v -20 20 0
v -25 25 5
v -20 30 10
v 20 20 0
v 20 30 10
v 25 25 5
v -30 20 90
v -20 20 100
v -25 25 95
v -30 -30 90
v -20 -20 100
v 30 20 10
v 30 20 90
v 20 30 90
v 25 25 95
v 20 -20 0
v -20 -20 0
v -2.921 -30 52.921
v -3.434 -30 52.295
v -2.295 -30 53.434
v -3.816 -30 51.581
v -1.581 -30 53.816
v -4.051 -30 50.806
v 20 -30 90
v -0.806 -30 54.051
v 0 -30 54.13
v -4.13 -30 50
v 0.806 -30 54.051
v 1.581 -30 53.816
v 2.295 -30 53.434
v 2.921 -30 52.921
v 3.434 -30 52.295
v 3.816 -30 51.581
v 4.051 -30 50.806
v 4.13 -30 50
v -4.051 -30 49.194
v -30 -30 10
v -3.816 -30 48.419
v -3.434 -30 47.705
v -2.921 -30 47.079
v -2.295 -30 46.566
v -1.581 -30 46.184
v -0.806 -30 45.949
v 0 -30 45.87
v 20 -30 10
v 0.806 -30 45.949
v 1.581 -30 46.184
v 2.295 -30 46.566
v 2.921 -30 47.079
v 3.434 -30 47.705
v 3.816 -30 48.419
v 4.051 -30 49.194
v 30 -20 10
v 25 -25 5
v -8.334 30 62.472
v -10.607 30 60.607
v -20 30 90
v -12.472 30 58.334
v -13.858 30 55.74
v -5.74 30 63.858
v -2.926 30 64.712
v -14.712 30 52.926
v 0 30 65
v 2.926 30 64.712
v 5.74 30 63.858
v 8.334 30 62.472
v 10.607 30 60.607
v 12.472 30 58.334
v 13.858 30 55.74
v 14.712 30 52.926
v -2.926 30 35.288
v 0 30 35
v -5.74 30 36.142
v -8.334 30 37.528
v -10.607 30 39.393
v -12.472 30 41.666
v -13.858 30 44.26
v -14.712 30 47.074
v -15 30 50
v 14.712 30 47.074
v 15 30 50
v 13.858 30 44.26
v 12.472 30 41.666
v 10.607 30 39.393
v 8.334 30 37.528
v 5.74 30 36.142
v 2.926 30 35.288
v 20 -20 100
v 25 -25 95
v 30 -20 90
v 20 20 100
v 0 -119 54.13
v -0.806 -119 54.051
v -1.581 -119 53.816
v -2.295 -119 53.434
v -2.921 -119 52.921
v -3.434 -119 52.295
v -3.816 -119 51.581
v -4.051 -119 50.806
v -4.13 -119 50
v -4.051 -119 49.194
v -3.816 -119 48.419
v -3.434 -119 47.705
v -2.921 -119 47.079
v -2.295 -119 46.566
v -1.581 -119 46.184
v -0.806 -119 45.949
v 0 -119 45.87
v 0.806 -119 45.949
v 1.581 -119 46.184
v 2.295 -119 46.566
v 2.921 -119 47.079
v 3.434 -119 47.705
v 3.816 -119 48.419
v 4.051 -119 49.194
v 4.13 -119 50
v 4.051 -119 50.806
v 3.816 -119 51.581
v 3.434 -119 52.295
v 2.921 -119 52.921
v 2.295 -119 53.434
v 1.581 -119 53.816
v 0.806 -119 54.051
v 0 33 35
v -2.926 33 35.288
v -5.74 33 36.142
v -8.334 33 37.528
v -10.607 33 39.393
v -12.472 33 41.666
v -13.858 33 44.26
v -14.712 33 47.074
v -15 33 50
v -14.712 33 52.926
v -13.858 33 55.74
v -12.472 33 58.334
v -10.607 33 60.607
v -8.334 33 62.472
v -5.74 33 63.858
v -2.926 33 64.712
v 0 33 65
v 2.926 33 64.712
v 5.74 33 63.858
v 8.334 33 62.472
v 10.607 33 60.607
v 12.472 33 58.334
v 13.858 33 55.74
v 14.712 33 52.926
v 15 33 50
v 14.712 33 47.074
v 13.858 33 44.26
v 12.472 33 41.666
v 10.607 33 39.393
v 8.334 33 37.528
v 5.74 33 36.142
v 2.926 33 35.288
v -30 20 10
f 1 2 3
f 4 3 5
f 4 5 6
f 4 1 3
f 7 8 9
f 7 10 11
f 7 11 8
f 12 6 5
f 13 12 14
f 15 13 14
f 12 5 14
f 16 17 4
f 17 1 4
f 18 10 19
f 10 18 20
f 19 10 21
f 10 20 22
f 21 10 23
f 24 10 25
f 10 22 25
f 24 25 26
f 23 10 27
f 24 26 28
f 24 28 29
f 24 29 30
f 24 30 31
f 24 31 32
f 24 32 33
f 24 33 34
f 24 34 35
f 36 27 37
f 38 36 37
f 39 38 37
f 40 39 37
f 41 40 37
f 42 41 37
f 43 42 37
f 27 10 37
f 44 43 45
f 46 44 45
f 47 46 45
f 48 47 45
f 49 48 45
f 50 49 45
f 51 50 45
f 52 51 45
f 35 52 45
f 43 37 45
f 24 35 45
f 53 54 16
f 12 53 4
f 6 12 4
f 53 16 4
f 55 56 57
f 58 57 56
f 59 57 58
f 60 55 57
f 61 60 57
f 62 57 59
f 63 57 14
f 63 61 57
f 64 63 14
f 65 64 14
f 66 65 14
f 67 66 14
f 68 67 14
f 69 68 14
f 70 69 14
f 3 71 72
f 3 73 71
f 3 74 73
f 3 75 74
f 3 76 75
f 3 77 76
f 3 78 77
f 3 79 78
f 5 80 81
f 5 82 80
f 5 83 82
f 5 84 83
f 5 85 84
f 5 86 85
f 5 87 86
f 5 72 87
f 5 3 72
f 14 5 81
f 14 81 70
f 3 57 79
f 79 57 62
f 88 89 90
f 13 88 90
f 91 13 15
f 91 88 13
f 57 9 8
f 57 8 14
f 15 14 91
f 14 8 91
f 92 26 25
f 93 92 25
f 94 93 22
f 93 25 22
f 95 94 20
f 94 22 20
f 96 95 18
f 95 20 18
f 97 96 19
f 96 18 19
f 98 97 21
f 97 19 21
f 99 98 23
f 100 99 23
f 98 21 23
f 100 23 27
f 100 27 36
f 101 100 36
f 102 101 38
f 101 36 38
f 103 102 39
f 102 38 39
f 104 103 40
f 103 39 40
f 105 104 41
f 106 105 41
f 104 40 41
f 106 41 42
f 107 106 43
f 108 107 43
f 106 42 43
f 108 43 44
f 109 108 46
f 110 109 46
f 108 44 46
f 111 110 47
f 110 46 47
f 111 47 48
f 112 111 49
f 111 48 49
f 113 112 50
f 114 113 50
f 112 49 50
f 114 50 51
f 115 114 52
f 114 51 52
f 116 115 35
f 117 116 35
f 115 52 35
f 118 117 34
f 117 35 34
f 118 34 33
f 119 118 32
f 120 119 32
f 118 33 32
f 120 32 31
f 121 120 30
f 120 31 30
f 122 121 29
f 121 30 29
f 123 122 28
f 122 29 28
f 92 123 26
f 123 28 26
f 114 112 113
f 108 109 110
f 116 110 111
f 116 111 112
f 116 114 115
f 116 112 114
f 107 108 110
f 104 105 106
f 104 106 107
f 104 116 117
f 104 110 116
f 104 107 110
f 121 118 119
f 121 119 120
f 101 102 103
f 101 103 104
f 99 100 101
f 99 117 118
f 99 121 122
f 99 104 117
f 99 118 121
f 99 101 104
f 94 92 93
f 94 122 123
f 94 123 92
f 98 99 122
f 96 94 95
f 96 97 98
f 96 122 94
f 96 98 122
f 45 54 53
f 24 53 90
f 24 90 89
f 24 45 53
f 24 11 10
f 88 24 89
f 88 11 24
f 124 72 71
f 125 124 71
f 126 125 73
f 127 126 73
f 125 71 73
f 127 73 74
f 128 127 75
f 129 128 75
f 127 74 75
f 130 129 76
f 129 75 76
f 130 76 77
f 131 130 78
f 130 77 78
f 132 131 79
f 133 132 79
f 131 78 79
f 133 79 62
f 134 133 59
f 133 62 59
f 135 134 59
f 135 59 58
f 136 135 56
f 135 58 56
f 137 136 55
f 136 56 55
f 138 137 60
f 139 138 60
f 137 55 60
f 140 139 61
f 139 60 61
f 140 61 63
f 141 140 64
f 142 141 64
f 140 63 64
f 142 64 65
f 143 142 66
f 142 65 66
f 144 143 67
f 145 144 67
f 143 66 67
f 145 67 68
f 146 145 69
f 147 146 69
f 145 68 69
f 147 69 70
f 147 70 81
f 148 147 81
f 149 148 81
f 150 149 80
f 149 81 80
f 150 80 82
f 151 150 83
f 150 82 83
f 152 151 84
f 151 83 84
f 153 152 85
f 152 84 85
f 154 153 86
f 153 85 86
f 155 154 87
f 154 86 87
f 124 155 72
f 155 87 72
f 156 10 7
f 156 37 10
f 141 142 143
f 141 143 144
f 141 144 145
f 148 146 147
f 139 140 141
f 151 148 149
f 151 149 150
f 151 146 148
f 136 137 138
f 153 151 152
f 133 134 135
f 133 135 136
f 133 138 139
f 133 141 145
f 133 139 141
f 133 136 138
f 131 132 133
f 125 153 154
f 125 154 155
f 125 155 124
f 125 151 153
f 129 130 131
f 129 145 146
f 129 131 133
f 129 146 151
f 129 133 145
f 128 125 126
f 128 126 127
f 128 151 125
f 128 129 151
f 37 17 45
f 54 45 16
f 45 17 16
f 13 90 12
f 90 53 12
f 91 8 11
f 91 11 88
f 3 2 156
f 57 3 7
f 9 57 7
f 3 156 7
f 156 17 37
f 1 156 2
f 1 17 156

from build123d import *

# Parameters (mm, degrees)
SKETCH_1_W      = 60
SKETCH_1_H      = 60
EXTRUDE_1_DEPTH = 100
CHAMFER_1_SIZE  = 10
CHAMFER_2_SIZE  = 10
CHAMFER_3_SIZE  = 10
CHAMFER_4_SIZE  = 10
CHAMFER_5_SIZE  = 10
CHAMFER_6_SIZE  = 10
CHAMFER_7_SIZE  = 10
CHAMFER_8_SIZE  = 10
SKETCH_4_R      = 15
EXTRUDE_2_DEPTH = 3
SKETCH_5_R      = 4.130427407
EXTRUDE_3_DEPTH = 89
CHAMFER_9_SIZE  = 10
CHAMFER_10_SIZE = 10
CHAMFER_11_SIZE = 10


with BuildPart() as part:
    # 草图1 → 凸台-拉伸1 (new body)
    with BuildSketch(Plane.XY):
        Rectangle(SKETCH_1_W, SKETCH_1_H)
    extrude(amount=EXTRUDE_1_DEPTH)

    # 倒角1
    chamfer_1_edges = [part.edges().sort_by_distance(p)[0] for p in [
        (0, 30, 0),
    ]]
    chamfer(chamfer_1_edges, length=CHAMFER_1_SIZE)

    # 倒角2
    chamfer_2_edges = [part.edges().sort_by_distance(p)[0] for p in [
        (-30, -5, 0),
    ]]
    chamfer(chamfer_2_edges, length=CHAMFER_2_SIZE)

    # 倒角3
    chamfer_3_edges = [part.edges().sort_by_distance(p)[0] for p in [
        (5, -30, 0),
    ]]
    chamfer(chamfer_3_edges, length=CHAMFER_3_SIZE)

    # 倒角4
    chamfer_4_edges = [part.edges().sort_by_distance(p)[0] for p in [
        (30, 0, 0),
    ]]
    chamfer(chamfer_4_edges, length=CHAMFER_4_SIZE)

    # 倒角5
    chamfer_5_edges = [part.edges().sort_by_distance(p)[0] for p in [
        (0, 30, 100),
    ]]
    chamfer(chamfer_5_edges, length=CHAMFER_5_SIZE)

    # 倒角6
    chamfer_6_edges = [part.edges().sort_by_distance(p)[0] for p in [
        (30, -5, 100),
    ]]
    chamfer(chamfer_6_edges, length=CHAMFER_6_SIZE)

    # 倒角7
    chamfer_7_edges = [part.edges().sort_by_distance(p)[0] for p in [
        (-30, -5, 100),
    ]]
    chamfer(chamfer_7_edges, length=CHAMFER_7_SIZE)

    # 倒角8
    chamfer_8_edges = [part.edges().sort_by_distance(p)[0] for p in [
        (0, -30, 100),
    ]]
    chamfer(chamfer_8_edges, length=CHAMFER_8_SIZE)

    # 草图4 → 凸台-拉伸2 (add)
    with BuildSketch(Plane(origin=(0, 30, 0), x_dir=(1, 0, 0), z_dir=(0, 1, 0))):
        with Locations(Location((0, -50, 0), (0, 0, 90))):  # turned: the seam where the file's is
            Circle(SKETCH_4_R)
    extrude(amount=EXTRUDE_2_DEPTH)

    # 草图5 → 凸台-拉伸3 (add)
    with BuildSketch(Plane.XZ.offset(30)):
        with Locations(Location((0, 50, 0), (0, 0, 90))):  # turned: the seam where the file's is
            Circle(SKETCH_5_R)
    extrude(amount=EXTRUDE_3_DEPTH)

    # 倒角9
    chamfer_9_edges = [part.edges().sort_by_distance(p)[0] for p in [
        (30, 30, 50),
    ]]
    chamfer(chamfer_9_edges, length=CHAMFER_9_SIZE)

    # 倒角10
    chamfer_10_edges = [part.edges().sort_by_distance(p)[0] for p in [
        (-30, 30, 50),
    ]]
    chamfer(chamfer_10_edges, length=CHAMFER_10_SIZE)

    # 倒角11
    chamfer_11_edges = [part.edges().sort_by_distance(p)[0] for p in [
        (30, -30, 50),
    ]]
    chamfer(chamfer_11_edges, length=CHAMFER_11_SIZE)


solid = part.part
